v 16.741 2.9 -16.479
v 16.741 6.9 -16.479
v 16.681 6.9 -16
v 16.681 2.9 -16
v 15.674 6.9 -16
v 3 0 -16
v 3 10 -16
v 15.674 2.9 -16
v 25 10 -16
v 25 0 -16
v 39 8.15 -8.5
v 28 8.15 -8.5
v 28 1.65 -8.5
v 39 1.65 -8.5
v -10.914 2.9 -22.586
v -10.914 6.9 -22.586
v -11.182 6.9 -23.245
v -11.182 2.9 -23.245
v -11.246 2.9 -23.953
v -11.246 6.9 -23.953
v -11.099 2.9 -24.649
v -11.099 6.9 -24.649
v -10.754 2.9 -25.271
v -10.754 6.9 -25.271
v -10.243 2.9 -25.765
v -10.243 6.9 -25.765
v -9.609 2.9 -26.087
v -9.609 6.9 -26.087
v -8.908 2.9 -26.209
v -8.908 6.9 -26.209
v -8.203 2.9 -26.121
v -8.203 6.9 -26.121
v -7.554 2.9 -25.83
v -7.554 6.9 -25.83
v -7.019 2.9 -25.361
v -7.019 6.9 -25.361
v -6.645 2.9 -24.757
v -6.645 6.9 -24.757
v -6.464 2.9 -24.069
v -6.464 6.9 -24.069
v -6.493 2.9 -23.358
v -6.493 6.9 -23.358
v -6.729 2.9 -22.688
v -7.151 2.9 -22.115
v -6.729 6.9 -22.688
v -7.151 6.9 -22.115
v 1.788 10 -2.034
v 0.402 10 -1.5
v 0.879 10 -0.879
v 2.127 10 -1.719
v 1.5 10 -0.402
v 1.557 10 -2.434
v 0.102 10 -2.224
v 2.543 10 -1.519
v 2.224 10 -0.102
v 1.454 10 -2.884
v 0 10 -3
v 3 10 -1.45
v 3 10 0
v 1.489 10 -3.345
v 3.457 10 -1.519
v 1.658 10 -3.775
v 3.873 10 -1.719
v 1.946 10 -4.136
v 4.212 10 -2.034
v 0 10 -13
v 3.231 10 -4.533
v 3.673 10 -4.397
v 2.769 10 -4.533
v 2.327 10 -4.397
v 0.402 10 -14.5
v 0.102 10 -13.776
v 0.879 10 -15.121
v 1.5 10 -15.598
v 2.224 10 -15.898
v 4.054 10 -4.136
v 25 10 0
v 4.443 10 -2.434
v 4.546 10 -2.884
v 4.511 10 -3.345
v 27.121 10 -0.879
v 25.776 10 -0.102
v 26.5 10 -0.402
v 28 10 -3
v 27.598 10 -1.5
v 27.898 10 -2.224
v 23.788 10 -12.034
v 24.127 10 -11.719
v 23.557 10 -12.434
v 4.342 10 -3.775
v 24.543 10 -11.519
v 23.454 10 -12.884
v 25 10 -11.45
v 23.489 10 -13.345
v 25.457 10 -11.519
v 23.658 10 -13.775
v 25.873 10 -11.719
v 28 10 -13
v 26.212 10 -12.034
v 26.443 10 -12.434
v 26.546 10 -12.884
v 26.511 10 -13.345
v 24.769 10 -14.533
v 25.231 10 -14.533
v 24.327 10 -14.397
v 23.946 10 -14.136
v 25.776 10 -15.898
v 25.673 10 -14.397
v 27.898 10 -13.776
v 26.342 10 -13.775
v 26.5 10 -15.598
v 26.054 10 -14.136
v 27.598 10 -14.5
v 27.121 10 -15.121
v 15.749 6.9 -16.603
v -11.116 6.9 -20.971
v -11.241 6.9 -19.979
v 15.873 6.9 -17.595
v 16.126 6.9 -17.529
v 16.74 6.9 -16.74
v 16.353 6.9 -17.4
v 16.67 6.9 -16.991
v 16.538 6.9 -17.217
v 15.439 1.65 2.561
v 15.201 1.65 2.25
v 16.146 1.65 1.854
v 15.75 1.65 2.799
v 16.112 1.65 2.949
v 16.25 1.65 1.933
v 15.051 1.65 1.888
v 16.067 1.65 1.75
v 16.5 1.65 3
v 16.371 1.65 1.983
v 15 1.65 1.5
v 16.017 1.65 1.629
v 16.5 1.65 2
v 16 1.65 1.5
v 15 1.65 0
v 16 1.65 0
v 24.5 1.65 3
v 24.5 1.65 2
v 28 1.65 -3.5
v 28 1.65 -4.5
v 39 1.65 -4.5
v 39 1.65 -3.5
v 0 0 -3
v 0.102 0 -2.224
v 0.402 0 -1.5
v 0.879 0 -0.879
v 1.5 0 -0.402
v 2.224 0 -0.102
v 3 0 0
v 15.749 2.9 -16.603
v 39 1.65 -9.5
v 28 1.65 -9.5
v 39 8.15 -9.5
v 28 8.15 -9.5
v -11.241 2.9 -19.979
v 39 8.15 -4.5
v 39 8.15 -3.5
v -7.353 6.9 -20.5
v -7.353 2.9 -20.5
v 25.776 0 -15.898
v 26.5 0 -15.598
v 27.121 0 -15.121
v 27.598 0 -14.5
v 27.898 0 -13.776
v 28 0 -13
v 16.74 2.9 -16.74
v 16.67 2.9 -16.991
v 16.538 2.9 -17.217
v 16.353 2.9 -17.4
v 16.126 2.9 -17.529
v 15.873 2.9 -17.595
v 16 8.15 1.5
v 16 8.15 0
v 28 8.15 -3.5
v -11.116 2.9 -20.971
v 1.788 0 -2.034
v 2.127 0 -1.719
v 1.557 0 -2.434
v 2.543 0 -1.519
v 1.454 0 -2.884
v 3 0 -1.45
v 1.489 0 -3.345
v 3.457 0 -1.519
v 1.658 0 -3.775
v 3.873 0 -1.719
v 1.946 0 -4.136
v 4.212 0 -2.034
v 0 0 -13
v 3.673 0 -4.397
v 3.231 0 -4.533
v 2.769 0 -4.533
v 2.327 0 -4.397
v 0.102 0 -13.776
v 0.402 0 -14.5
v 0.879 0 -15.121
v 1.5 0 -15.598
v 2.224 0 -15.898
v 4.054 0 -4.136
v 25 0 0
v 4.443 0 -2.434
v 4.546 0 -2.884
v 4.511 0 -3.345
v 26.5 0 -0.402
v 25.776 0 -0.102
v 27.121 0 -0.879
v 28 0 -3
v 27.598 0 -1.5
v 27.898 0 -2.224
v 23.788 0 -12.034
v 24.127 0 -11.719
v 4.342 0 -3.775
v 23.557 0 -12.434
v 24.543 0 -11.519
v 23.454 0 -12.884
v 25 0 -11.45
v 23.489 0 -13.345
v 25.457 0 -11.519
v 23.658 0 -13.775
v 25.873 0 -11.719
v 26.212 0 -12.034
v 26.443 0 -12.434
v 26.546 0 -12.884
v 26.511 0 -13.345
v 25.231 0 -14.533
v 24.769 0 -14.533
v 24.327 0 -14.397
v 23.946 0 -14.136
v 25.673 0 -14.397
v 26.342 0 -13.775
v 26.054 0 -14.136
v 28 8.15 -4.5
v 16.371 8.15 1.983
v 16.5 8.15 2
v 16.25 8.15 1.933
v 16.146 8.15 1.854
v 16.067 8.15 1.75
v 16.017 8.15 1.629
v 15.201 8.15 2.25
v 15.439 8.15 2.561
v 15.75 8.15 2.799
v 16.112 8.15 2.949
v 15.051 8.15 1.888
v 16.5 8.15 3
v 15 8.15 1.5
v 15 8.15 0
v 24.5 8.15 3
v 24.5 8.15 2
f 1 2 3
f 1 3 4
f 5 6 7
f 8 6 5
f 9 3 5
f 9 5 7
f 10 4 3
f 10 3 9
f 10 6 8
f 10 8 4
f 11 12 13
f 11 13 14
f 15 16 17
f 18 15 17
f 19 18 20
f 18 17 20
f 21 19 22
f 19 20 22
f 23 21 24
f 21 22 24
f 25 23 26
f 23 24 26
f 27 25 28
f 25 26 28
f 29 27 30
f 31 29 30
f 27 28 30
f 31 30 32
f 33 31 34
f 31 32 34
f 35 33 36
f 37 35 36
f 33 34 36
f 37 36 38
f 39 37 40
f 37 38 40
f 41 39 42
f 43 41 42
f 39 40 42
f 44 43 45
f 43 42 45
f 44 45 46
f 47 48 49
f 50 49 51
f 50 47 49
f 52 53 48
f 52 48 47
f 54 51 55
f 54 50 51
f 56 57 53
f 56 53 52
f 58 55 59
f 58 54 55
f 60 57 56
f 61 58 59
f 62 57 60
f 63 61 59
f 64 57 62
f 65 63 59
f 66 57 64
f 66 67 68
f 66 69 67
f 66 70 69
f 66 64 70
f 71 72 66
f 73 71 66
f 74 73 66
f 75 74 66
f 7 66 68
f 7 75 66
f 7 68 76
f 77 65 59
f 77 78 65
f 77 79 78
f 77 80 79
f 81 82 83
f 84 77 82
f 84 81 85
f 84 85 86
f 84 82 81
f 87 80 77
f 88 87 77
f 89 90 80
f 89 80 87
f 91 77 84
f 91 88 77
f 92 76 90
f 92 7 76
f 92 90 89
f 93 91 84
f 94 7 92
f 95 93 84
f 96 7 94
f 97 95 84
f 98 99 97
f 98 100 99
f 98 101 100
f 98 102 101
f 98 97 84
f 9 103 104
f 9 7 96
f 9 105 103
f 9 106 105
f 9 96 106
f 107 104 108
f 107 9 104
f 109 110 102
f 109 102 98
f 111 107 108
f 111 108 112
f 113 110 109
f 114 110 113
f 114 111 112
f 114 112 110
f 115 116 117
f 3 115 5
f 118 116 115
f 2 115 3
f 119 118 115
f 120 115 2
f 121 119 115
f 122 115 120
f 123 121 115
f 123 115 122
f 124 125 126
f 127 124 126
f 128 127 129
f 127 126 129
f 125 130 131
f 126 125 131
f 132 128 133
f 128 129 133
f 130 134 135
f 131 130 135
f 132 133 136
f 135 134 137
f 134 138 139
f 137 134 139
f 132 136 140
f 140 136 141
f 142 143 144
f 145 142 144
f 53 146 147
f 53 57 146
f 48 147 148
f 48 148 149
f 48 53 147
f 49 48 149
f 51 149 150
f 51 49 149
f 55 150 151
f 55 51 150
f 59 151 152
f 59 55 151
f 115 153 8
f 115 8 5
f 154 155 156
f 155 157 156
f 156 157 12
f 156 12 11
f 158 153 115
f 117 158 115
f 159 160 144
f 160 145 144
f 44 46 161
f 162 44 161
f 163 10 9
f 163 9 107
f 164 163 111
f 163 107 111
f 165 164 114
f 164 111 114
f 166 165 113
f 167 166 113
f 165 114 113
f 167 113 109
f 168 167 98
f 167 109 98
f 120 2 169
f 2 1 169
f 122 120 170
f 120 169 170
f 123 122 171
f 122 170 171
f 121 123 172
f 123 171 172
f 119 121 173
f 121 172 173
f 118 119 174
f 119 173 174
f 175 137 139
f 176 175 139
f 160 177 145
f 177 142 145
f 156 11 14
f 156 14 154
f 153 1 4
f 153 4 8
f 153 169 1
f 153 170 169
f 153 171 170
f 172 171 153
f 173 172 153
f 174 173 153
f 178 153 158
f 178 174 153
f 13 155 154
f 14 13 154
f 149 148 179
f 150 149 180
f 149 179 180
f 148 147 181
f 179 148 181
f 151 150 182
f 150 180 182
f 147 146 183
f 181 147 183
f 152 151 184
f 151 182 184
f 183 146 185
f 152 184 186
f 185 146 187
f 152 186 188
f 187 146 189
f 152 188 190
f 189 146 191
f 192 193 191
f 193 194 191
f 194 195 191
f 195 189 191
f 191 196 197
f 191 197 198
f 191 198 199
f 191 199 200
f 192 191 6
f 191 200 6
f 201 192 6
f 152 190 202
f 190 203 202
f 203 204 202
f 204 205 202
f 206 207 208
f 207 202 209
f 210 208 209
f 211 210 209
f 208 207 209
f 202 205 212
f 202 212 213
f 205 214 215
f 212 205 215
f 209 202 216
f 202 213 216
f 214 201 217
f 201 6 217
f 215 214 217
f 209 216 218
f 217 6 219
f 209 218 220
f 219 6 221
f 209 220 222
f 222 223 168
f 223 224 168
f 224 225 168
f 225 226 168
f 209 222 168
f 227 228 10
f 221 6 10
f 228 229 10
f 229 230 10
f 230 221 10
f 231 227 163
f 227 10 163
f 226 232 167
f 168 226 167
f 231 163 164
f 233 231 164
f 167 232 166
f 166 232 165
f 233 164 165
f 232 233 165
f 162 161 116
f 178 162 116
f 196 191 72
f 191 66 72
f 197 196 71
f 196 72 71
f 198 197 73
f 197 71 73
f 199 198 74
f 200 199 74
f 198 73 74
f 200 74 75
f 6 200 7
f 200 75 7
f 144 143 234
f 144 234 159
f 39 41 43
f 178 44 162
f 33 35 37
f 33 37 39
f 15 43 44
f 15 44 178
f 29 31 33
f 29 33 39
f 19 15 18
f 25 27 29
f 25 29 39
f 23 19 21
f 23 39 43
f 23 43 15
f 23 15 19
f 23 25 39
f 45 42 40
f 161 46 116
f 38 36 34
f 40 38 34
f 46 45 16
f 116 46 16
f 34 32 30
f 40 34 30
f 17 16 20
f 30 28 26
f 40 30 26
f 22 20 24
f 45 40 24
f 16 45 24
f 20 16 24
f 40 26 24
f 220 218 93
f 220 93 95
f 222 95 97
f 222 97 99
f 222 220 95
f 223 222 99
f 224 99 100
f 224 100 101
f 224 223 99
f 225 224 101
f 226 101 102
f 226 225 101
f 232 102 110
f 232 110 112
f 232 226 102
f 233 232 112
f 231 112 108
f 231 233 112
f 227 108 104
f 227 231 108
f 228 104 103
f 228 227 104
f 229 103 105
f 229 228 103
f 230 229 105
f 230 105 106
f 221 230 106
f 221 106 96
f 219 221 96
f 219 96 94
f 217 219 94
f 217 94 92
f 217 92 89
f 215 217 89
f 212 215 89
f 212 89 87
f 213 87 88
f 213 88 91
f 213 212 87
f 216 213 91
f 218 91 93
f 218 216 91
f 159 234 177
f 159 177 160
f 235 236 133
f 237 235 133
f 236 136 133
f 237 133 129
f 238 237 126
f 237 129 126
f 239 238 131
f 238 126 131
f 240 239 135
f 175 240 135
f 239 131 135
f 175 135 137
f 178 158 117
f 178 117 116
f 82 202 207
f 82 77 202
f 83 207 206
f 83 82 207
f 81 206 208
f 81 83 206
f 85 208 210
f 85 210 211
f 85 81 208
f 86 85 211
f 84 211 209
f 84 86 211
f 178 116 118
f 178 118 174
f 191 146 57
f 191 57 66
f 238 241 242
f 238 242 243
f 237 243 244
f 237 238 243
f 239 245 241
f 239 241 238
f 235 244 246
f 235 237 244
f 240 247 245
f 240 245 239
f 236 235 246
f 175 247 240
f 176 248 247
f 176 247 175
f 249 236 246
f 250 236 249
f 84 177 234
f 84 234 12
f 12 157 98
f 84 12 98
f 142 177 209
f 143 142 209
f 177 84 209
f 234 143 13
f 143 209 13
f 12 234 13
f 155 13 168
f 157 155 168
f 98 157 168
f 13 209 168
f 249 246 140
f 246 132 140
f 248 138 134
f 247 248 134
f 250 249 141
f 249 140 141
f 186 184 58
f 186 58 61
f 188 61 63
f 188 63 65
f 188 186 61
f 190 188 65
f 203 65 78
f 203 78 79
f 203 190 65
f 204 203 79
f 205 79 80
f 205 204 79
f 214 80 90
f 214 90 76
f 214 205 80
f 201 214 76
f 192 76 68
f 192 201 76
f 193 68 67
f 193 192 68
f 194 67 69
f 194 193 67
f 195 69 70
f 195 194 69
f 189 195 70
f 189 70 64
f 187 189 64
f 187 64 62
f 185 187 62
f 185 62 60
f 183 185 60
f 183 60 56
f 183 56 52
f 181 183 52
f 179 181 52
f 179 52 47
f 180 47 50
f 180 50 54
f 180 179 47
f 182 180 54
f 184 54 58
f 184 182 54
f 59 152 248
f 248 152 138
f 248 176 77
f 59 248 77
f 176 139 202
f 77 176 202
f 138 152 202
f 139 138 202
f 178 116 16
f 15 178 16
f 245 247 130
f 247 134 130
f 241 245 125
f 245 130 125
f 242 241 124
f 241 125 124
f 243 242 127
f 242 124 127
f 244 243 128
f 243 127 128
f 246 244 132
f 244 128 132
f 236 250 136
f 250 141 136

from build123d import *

# Parameters (mm, degrees)
SKETCH_1_W        = 28
SKETCH_1_H        = 16
SKETCH_1_R        = 1.55
EXTRUDE_1_DEPTH   = 10
FILLET_1_R        = 3
SKETCH_3_W        = 1
SKETCH_3_H        = 4
EXTRUDE_2_DEPTH   = 4
SKETCH_5_W        = 11
SKETCH_5_H        = 1
EXTRUDE_1_2_DEPTH = 3.25


with BuildPart() as part:
    # 草图1 → Extrude 1 (new body)
    with BuildSketch(Plane(origin=(0, 0, 0), x_dir=(1, 0, 0), z_dir=(0, 1, 0))):
        with Locations((14, 8)):
            Rectangle(SKETCH_1_W, SKETCH_1_H)
        with Locations(Location((25, 13, 0), (0, 0, 270))):
            Circle(SKETCH_1_R, mode=Mode.SUBTRACT)
        with Locations(Location((3, 3, 0), (0, 0, 270))):
            Circle(SKETCH_1_R, mode=Mode.SUBTRACT)
    extrude(amount=EXTRUDE_1_DEPTH)

    # 圆角1
    fillet_1_edges = [part.edges().sort_by_distance(p)[0] for p in [
        (0, 5, -16),
        (28, 5, -16),
        (28, 5, 0),
        (0, 5, 0),
    ]]
    fillet(fillet_1_edges, radius=FILLET_1_R)

    # 扫描1: sweep along a path in 草图2
    with BuildLine(Plane(origin=(0, 4.9, 0), x_dir=(1, 0, 0), z_dir=(0, 1, 0))) as sweep_1_path:
        Line((16.4, 13.75), (16.74133287, 16.478734482))
        ThreePointArc((16.74133287, 16.478734482), (16.538471401, 17.216727478), (15.873186829, 17.59512261))
        Line((15.873186829, 17.59512261), (-11.116477863, 20.971214994))
    # 草图3 → 扫描1 (sweep)
    with BuildSketch(Plane(origin=(-0.012274363, 0, -15.802984175), x_dir=(-0.9922670842798479, 0, -0.12412104356139277), z_dir=(0.12412104356139277, 0, -0.9922670842798479))):
        with Locations((-16.040178167, 4.9)):
            Rectangle(SKETCH_3_W, SKETCH_3_H)
    sweep(path=sweep_1_path.line)

    # 草图5 → Extrude 1 2 (add, symmetric)
    with BuildSketch(Plane(origin=(0, 4.9, 0), x_dir=(1, 0, 0), z_dir=(0, 1, 0))):
        with BuildLine():
            Line((15, 0), (15, -1.5))
            ThreePointArc((15, -1.5), (15.439339828, -2.560660172), (16.5, -3))
            Line((16.5, -3), (24.5, -3))
            Line((24.5, -3), (24.5, -2))
            Line((24.5, -2), (16.5, -2))
            ThreePointArc((16.5, -2), (16.146446609, -1.853553391), (16, -1.5))
            Line((16, -1.5), (16, 0))
            Line((16, 0), (15, 0))
        make_face()
        with Locations((33.5, 4)):
            Rectangle(SKETCH_5_W, SKETCH_5_H)
        with Locations((33.5, 9)):
            Rectangle(SKETCH_5_W, SKETCH_5_H)
    extrude(amount=EXTRUDE_1_2_DEPTH, both=True)


with BuildPart() as body_2:
    # 草图4 → 凸台-拉伸2 (new body)
    with BuildSketch(Plane(origin=(0, 6.9, 0), x_dir=(1, 0, 0), z_dir=(0, 1, 0))):
        with BuildLine():
            Line((-11.116477863, 20.971214994), (-10.914475147, 22.586095442))
            ThreePointArc((-10.914475147, 22.586095442), (-8.552109495, 26.191441002), (-7.150610771, 22.115279891))
            Line((-7.150610771, 22.115279891), (-7.352613487, 20.500399443))
            Line((-7.352613487, 20.500399443), (-11.116477863, 20.971214994))
        make_face()
    extrude(amount=-EXTRUDE_2_DEPTH)


solid = Compound([part.part, body_2.part])
